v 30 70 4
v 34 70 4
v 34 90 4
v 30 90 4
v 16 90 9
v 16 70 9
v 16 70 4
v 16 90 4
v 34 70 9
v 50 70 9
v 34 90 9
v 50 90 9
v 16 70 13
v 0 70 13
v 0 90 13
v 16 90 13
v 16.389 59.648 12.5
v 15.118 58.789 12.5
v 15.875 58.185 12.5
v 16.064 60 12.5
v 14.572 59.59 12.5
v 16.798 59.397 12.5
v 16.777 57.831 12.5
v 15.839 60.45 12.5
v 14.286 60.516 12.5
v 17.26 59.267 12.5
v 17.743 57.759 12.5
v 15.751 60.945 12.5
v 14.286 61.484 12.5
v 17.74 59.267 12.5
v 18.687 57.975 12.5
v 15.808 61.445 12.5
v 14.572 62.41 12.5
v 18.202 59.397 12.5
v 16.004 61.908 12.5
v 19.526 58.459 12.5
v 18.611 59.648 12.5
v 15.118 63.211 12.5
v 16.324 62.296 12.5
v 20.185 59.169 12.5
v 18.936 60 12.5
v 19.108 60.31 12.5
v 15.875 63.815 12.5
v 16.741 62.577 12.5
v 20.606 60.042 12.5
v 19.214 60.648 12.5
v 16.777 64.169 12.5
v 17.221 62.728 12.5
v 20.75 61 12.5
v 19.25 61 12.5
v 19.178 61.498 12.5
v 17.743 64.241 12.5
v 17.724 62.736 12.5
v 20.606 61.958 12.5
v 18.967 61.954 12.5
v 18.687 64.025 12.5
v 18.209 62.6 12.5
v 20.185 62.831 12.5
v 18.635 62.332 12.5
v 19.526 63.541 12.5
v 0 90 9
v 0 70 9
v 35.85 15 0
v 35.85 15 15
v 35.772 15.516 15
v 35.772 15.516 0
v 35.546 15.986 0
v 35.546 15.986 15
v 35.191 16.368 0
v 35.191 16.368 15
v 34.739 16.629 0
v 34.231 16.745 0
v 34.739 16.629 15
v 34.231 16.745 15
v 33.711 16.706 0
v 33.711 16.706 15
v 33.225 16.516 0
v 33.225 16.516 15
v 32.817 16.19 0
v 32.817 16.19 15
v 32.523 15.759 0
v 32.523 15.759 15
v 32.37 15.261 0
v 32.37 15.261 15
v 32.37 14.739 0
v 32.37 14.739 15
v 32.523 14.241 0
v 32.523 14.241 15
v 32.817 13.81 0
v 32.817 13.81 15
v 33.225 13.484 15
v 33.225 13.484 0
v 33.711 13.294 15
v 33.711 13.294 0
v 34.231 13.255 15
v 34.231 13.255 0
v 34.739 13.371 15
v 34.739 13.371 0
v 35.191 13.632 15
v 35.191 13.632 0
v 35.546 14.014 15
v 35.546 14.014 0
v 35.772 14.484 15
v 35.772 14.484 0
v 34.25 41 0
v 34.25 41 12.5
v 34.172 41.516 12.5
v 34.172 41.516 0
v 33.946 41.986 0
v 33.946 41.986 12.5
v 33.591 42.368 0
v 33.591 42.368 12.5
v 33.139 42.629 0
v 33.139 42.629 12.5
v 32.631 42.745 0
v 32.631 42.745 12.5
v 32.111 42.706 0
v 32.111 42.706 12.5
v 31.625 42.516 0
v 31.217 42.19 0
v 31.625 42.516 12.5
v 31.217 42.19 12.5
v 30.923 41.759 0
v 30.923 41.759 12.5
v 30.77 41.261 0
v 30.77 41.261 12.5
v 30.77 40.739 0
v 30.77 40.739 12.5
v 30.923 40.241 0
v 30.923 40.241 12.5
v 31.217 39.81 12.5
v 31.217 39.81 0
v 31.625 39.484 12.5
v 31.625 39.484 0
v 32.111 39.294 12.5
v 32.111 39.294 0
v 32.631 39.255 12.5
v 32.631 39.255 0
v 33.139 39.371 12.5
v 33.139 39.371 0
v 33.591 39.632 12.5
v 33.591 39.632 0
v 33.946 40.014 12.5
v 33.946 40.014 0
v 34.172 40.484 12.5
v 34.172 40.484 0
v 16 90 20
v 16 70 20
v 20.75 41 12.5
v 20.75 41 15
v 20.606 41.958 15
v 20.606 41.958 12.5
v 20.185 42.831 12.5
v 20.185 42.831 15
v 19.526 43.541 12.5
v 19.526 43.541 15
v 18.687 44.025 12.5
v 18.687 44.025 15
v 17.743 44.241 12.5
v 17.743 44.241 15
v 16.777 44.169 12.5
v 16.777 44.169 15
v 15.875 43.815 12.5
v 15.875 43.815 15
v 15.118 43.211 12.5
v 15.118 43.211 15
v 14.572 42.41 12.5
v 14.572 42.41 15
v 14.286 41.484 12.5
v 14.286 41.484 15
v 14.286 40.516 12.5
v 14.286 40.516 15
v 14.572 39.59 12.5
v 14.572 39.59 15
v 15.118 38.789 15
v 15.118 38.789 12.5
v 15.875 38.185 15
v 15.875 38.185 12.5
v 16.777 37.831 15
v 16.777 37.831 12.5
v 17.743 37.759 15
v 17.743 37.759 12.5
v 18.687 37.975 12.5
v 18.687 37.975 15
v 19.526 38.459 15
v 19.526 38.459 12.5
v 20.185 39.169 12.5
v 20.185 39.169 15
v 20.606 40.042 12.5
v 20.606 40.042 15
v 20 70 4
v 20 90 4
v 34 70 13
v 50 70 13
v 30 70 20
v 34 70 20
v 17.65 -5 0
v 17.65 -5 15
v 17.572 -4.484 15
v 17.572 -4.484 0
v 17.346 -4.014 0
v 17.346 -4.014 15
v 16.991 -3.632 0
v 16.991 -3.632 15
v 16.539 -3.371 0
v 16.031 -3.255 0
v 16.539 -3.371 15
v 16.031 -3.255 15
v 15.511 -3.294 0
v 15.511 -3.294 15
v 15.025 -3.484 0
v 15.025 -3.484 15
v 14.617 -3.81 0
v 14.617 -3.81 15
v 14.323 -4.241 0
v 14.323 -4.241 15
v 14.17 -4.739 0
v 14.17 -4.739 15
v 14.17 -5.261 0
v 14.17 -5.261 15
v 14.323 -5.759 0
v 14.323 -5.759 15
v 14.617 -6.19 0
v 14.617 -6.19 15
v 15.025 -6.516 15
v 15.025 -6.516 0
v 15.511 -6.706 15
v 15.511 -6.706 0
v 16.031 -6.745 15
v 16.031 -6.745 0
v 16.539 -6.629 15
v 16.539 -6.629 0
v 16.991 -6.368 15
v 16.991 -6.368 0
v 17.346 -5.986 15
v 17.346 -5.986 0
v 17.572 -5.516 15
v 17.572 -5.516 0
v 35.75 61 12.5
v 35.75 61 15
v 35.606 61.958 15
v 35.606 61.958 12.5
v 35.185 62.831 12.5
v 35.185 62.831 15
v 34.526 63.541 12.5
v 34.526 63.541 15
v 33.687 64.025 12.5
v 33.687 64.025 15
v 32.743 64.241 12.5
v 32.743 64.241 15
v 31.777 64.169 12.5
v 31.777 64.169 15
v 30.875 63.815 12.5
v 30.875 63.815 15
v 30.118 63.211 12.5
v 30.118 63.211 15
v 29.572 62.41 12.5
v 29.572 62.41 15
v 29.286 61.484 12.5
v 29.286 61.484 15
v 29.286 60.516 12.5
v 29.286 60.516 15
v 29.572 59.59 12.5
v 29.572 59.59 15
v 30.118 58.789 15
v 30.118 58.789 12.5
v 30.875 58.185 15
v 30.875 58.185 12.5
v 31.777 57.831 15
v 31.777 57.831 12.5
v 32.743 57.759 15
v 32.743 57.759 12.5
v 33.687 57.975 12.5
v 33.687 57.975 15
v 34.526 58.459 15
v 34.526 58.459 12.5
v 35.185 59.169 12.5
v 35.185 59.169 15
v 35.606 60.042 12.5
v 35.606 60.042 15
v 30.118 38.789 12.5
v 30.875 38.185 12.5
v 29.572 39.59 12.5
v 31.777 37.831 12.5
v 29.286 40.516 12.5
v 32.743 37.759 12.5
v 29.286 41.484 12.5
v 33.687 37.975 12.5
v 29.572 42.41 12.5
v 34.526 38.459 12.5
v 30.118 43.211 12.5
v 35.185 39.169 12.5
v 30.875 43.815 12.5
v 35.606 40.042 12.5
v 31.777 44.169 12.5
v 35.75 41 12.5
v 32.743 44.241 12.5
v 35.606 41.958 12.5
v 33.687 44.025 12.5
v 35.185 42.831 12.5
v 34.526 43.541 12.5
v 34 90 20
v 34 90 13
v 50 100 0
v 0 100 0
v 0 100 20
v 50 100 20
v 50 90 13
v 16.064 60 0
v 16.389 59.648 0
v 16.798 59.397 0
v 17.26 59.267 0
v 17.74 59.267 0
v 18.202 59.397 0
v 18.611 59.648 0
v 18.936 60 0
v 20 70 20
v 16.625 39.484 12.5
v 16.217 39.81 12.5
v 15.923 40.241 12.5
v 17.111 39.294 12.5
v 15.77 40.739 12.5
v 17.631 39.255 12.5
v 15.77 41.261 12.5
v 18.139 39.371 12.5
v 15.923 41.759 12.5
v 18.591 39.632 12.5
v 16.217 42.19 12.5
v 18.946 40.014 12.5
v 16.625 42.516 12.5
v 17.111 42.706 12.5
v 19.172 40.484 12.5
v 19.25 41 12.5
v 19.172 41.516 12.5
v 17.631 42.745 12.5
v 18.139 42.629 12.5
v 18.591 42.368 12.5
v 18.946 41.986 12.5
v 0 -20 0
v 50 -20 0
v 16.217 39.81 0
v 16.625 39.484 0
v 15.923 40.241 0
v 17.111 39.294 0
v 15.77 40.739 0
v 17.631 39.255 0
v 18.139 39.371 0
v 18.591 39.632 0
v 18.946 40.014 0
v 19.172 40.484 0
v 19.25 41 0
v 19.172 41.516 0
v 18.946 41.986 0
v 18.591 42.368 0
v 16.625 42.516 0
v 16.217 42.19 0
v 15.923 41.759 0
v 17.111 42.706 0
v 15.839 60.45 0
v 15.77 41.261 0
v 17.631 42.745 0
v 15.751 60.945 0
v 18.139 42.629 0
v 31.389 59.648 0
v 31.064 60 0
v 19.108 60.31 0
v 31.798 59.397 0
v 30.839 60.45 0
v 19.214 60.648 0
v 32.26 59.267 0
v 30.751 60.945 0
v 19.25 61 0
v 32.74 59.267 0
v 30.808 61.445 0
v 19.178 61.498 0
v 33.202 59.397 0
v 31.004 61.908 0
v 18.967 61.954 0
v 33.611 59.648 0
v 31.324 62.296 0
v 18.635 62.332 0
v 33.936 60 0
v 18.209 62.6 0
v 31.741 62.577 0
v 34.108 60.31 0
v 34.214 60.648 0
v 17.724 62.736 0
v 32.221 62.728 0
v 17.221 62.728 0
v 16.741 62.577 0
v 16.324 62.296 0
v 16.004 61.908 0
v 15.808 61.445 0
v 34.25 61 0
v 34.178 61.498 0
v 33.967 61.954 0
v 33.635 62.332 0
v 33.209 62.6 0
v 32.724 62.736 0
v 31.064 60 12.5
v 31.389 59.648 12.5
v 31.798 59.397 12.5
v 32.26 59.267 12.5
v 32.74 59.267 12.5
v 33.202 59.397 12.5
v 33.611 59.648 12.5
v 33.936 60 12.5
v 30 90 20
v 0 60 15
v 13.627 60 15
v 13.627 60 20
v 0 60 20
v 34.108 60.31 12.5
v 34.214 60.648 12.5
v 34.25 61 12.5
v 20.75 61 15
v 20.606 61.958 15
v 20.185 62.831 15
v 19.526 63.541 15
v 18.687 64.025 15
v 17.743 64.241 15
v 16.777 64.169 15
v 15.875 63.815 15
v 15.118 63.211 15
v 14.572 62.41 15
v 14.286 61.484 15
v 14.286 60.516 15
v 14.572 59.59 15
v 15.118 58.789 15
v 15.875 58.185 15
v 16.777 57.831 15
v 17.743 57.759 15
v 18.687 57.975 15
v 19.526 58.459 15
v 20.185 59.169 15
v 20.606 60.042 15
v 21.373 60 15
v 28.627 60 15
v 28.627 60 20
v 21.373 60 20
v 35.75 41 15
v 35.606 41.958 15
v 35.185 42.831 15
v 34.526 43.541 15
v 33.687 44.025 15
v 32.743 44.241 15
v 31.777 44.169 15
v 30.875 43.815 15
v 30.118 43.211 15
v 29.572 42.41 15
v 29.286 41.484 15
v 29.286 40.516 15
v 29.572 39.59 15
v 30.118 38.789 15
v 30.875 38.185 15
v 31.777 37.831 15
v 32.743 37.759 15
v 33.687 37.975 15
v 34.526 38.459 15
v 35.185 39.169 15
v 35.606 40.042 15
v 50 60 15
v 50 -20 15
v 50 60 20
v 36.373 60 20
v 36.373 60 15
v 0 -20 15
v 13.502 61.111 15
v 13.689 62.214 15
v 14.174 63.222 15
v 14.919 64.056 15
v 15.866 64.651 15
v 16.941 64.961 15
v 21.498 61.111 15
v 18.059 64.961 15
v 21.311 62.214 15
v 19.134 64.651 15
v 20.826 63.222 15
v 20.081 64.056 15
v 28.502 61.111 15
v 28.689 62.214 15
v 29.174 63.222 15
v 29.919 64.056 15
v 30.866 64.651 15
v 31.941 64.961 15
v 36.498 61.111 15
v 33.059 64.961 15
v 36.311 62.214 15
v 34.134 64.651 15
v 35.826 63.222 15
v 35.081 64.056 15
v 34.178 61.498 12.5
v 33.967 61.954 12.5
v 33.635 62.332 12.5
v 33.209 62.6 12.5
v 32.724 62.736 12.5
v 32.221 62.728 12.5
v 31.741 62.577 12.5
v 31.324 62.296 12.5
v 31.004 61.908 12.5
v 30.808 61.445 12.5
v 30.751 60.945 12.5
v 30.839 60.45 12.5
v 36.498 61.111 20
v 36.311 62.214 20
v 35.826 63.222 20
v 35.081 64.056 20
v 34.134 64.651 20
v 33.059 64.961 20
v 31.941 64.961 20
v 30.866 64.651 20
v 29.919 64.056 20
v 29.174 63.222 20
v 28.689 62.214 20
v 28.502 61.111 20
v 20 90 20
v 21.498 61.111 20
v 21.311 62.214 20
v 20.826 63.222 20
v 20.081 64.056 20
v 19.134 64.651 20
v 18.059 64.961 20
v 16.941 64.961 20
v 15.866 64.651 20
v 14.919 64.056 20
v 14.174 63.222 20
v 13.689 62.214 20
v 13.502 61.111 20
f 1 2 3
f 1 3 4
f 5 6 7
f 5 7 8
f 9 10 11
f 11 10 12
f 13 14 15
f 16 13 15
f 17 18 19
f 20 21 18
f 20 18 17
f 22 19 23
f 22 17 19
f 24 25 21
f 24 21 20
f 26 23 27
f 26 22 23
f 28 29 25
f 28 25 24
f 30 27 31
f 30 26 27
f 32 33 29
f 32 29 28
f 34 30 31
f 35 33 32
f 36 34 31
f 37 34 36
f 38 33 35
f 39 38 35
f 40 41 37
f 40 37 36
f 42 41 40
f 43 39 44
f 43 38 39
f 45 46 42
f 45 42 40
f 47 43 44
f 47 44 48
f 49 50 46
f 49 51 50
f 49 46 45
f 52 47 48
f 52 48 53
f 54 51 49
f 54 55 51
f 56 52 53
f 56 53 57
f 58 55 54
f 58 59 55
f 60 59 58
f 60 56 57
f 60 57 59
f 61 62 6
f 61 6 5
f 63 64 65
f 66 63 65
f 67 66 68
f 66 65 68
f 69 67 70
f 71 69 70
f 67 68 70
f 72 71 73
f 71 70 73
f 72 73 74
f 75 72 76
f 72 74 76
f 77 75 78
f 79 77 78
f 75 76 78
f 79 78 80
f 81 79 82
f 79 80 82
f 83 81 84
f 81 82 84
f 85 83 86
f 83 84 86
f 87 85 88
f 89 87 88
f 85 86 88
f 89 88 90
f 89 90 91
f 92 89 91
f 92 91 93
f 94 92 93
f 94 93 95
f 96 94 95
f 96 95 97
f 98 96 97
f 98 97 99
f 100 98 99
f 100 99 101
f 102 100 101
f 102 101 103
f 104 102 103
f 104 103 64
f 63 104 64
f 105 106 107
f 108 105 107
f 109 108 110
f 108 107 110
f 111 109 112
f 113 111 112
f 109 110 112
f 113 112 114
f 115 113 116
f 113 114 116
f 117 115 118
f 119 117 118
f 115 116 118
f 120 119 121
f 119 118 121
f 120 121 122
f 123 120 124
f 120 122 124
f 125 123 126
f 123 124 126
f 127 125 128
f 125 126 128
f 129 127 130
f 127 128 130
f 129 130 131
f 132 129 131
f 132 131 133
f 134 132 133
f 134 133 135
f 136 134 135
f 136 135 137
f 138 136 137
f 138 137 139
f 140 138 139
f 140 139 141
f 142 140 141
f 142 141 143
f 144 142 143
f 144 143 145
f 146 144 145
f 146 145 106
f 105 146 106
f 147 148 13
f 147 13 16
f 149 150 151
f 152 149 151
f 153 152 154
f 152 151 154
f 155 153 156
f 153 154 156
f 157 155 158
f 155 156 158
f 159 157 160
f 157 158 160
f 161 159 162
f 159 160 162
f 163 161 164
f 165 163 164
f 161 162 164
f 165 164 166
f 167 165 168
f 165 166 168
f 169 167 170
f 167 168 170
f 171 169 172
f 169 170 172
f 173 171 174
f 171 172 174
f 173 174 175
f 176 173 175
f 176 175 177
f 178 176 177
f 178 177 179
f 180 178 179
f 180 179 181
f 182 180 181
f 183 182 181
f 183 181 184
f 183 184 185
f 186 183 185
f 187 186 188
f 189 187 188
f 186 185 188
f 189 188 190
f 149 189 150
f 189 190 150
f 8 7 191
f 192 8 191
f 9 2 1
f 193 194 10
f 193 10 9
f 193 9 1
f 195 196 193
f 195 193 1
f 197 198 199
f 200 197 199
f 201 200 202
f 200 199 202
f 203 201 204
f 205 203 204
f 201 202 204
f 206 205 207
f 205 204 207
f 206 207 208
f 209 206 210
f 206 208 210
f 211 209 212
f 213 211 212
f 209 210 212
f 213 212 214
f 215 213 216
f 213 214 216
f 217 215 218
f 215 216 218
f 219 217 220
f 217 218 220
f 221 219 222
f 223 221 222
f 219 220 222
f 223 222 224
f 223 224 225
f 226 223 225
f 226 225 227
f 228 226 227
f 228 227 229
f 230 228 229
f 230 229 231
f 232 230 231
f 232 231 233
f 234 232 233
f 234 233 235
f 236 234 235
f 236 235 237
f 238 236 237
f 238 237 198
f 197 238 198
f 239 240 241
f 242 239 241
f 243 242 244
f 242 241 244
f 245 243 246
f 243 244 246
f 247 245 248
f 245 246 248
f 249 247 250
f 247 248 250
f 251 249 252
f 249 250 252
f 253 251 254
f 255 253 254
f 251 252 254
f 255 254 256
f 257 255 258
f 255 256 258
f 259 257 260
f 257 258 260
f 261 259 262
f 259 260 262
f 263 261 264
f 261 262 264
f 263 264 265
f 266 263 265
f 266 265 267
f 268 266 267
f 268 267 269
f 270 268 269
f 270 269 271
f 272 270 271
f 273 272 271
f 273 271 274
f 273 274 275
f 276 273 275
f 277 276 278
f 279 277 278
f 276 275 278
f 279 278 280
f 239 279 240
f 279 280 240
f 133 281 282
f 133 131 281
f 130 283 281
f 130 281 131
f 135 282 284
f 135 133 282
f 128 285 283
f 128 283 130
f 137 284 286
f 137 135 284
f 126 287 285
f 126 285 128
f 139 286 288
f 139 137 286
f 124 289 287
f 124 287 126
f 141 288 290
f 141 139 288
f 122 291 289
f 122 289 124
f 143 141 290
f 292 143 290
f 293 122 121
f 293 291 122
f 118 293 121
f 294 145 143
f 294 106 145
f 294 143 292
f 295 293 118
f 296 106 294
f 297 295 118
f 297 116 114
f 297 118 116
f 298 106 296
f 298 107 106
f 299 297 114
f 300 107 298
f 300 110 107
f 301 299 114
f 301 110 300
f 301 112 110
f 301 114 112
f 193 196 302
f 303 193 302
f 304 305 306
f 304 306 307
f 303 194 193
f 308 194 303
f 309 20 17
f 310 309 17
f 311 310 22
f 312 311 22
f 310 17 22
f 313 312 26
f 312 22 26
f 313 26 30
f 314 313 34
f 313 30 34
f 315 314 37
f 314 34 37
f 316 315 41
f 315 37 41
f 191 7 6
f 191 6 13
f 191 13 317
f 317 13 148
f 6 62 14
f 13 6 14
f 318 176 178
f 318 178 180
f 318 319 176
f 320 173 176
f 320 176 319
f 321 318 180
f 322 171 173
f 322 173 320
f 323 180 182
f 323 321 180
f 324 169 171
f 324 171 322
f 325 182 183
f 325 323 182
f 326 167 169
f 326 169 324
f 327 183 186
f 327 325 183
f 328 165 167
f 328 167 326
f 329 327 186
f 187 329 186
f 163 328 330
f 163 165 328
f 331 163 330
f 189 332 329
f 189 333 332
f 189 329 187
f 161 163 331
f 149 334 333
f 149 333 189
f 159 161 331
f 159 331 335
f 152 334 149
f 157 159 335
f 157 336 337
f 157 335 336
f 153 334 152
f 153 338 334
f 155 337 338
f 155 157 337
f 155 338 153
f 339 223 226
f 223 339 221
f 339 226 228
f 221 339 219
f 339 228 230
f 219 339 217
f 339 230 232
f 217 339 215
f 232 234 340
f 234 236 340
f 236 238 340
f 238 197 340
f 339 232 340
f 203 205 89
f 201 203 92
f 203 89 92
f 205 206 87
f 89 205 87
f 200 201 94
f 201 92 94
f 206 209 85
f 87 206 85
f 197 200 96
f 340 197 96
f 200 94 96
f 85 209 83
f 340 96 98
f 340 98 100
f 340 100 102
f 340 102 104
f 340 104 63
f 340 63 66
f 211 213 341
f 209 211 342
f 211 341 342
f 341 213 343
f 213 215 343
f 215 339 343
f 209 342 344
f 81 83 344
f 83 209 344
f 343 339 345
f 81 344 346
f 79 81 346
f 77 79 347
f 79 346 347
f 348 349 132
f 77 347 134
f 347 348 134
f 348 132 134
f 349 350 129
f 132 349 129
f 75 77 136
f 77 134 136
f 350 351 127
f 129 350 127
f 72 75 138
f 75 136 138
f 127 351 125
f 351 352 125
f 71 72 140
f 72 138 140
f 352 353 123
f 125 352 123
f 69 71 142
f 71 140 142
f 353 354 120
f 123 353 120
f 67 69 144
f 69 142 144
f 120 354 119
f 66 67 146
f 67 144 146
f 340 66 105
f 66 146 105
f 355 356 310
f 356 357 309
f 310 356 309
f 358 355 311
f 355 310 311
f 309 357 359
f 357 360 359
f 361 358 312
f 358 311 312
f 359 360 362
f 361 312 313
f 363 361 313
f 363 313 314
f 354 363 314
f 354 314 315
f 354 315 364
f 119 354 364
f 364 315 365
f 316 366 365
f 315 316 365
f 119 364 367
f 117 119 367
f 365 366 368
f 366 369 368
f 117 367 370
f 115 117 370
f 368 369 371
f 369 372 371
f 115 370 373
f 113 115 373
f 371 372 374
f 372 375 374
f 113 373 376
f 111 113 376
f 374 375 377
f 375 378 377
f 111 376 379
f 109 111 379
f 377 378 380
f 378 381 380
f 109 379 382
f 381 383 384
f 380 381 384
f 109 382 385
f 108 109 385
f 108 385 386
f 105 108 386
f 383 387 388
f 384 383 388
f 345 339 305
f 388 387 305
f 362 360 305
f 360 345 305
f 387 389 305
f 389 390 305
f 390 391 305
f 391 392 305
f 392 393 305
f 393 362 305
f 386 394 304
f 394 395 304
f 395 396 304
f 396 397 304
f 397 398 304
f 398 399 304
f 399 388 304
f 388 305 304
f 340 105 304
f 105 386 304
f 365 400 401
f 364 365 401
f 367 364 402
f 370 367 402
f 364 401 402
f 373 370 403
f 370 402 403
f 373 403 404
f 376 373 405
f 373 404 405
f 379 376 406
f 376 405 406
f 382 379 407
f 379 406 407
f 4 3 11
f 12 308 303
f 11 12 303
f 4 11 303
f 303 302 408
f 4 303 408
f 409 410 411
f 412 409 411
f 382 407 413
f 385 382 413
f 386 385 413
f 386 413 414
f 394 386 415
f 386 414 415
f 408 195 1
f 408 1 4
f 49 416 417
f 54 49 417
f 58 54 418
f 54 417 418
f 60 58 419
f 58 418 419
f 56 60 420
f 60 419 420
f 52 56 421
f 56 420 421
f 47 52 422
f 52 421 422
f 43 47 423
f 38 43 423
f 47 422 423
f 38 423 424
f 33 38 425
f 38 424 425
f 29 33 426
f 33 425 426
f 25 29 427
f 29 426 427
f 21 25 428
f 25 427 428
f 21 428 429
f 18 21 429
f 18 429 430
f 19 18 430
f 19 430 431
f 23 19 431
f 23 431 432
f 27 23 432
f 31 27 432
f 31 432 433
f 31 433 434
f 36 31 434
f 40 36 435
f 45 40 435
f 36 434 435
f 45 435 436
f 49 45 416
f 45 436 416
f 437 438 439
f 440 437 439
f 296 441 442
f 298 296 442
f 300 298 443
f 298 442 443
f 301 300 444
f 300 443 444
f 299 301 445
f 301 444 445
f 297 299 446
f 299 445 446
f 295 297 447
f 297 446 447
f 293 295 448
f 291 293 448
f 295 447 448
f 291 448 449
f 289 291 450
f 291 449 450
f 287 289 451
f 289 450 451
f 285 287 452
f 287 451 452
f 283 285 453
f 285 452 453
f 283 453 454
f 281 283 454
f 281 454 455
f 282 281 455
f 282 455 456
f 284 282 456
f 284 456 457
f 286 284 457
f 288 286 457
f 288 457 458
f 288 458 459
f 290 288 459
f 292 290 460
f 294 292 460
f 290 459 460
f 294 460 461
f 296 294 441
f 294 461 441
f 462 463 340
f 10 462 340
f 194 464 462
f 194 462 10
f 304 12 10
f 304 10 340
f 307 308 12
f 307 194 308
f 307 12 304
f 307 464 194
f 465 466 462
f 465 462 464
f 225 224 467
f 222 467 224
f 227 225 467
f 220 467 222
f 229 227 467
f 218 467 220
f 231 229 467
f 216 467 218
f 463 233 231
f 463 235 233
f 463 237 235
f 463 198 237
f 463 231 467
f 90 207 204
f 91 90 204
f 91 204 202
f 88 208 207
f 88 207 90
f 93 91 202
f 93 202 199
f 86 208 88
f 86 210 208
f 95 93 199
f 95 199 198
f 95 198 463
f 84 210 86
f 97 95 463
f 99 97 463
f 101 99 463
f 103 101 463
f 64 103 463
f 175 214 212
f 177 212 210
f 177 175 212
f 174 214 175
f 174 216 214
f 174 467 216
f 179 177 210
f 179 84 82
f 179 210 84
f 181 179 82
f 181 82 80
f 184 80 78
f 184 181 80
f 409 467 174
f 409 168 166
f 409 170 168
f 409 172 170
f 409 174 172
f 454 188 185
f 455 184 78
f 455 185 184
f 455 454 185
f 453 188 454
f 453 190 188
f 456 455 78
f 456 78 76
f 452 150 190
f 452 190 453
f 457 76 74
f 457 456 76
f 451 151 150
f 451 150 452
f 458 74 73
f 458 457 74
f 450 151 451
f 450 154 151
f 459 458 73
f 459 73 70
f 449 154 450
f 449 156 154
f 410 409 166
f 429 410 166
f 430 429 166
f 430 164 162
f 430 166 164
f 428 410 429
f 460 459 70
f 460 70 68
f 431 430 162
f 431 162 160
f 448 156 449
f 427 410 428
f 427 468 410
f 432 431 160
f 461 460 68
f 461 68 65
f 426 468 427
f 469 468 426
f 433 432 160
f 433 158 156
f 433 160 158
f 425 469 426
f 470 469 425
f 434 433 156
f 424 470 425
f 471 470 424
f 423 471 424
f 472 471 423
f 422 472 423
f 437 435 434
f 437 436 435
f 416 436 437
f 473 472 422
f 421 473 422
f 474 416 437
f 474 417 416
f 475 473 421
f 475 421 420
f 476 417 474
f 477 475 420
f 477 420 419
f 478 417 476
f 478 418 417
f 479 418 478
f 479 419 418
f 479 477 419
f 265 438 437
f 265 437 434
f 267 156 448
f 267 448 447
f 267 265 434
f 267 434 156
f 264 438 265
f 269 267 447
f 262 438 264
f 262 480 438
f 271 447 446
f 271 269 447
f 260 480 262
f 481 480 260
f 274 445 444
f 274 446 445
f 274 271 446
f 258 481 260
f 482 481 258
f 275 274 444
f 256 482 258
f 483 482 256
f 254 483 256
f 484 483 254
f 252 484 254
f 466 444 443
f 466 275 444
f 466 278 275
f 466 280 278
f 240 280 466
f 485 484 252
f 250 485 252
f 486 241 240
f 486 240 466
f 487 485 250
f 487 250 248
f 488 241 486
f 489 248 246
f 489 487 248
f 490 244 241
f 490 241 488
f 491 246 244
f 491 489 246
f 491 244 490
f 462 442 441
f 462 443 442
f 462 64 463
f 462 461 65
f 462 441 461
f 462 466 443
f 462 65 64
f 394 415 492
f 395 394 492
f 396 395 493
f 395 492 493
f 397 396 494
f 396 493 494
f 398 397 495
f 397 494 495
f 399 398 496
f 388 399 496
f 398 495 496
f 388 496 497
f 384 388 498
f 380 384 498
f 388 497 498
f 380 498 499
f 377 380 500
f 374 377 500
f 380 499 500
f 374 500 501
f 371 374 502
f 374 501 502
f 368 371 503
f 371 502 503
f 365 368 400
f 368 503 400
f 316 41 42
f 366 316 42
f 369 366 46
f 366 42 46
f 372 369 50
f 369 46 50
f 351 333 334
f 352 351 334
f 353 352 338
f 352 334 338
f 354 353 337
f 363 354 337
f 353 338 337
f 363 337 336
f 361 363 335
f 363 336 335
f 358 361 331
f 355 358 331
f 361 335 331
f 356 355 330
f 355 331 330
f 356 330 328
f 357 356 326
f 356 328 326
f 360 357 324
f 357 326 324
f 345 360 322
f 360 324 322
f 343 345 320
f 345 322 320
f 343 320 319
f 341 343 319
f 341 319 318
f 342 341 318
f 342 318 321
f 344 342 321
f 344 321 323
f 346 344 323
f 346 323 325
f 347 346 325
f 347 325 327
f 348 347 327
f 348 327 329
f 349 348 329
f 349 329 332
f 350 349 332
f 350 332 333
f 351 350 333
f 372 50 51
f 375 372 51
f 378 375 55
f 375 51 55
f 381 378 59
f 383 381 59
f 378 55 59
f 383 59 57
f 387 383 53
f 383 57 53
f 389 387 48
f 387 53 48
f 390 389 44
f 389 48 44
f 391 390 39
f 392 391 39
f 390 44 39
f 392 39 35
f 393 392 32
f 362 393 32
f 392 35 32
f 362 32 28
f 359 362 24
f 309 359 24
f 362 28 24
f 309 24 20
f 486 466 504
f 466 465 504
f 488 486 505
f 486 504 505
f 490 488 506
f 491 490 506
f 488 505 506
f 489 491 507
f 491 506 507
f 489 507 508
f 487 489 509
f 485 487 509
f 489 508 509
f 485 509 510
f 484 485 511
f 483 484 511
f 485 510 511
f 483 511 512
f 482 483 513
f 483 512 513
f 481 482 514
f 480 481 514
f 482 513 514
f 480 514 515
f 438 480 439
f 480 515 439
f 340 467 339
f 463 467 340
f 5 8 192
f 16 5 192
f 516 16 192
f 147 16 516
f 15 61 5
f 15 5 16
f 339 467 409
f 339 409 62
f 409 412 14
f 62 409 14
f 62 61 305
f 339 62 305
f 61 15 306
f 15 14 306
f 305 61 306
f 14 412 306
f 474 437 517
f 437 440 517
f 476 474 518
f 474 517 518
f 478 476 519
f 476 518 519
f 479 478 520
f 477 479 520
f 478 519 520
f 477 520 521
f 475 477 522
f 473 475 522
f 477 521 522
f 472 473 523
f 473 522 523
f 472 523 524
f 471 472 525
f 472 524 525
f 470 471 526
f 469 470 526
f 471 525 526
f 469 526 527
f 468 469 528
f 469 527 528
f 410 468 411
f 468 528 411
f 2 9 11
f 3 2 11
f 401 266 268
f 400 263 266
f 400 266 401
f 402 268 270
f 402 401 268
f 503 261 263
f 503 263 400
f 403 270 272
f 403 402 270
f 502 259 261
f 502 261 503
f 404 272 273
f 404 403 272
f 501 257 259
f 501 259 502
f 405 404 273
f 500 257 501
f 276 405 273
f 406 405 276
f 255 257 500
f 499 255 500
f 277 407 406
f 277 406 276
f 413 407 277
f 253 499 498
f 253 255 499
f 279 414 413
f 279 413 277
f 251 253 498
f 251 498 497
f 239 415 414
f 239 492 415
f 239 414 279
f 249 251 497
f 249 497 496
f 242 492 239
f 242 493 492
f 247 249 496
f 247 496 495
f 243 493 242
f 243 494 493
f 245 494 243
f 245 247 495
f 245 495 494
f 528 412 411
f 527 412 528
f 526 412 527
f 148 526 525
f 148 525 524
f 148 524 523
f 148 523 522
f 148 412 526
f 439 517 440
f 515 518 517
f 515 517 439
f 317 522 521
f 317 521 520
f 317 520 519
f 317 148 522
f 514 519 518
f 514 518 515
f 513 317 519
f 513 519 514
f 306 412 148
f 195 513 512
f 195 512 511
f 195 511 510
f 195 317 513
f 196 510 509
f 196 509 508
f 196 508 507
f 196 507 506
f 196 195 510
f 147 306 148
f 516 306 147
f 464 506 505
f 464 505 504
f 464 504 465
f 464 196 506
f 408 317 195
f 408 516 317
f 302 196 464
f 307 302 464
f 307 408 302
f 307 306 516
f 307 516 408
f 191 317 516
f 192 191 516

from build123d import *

# Parameters (mm, degrees)
SKETCH1_W           = 50
SKETCH1_H           = 100
BOSS_EXTRUDE1_DEPTH = 20
SKETCH2_W           = 4
SKETCH2_H           = 20
CUT_EXTRUDE1_DEPTH  = 20
SKETCH3_W           = 4
SKETCH3_H           = 20
CUT_EXTRUDE2_DEPTH  = 16
SKETCH4_W           = 5
SKETCH4_H           = 60
CUT_EXTRUDE3_DEPTH  = 114.578166916
SKETCH6_R           = 1.75
CUT_EXTRUDE5_DEPTH  = 114.578166916
SKETCH7_R           = 4
CUT_EXTRUDE6_DEPTH  = 5
SKETCH8_R           = 3.25
CUT_EXTRUDE7_DEPTH  = 2.5
SKETCH9_W           = 50
SKETCH9_H           = 20
BOSS_EXTRUDE2_DEPTH = 15
SKETCH5_R           = 1.75
CUT_EXTRUDE4_DEPTH  = 113.805141727


with BuildPart() as part:
    # Sketch1 → Boss-Extrude1 (new body)
    with BuildSketch(Plane.XY):
        with Locations((25, 50)):
            Rectangle(SKETCH1_W, SKETCH1_H)
    extrude(amount=BOSS_EXTRUDE1_DEPTH)

    # Sketch2 → Cut-Extrude1 (cut)
    with BuildSketch(Plane.ZY):
        with Locations((11, 80)):
            Rectangle(SKETCH2_W, SKETCH2_H)
    cut_extrude1 = extrude(amount=-CUT_EXTRUDE1_DEPTH, mode=Mode.SUBTRACT)

    # Sketch3 → Cut-Extrude2 (cut)
    with BuildSketch(Plane.XY.offset(20)):
        with Locations((18, 80)):
            Rectangle(SKETCH3_W, SKETCH3_H)
    cut_extrude2 = extrude(amount=-CUT_EXTRUDE2_DEPTH, mode=Mode.SUBTRACT)

    # Mirror1: Cut-Extrude1, Cut-Extrude2 across plane
    add(cut_extrude1.mirror(Plane.ZY.offset(-25)), mode=Mode.SUBTRACT)
    add(cut_extrude2.mirror(Plane.ZY.offset(-25)), mode=Mode.SUBTRACT)

    # Sketch4 → Cut-Extrude3 (cut, through all)
    with BuildSketch(Plane.ZY):
        with Locations((17.5, 30)):
            Rectangle(SKETCH4_W, SKETCH4_H)
    extrude(amount=-CUT_EXTRUDE3_DEPTH, mode=Mode.SUBTRACT)

    # Sketch6 → Cut-Extrude5 (cut, through all)
    with BuildSketch(Plane.XY.offset(20)):
        with BuildLine():
            ThreePointArc((19.25, 61), (16.975951413, 62.66969251), (16.063859338, 60))
            Line((16.063859338, 60), (18.936140662, 60))
            ThreePointArc((18.936140662, 60), (19.16969251, 60.475951413), (19.25, 61))
        make_face()
        with BuildLine():
            Line((18.936140662, 60), (16.063859338, 60))
            ThreePointArc((16.063859338, 60), (17.5, 59.25), (18.936140662, 60))
        make_face()
        with BuildLine():
            ThreePointArc((34.25, 61), (31.975951413, 62.66969251), (31.063859338, 60))
            Line((31.063859338, 60), (33.936140662, 60))
            ThreePointArc((33.936140662, 60), (34.16969251, 60.475951413), (34.25, 61))
        make_face()
        with BuildLine():
            Line((33.936140662, 60), (31.063859338, 60))
            ThreePointArc((31.063859338, 60), (32.5, 59.25), (33.936140662, 60))
        make_face()
        with Locations((32.5, 41)):
            Circle(SKETCH6_R)
        with Locations((17.5, 41)):
            Circle(SKETCH6_R)
    extrude(amount=-CUT_EXTRUDE5_DEPTH, mode=Mode.SUBTRACT)

    # Sketch7 → Cut-Extrude6 (cut)
    with BuildSketch(Plane.XY.offset(20)):
        with Locations((32.5, 61)):
            Circle(SKETCH7_R)
        with Locations((17.5, 61)):
            Circle(SKETCH7_R)
    extrude(amount=-CUT_EXTRUDE6_DEPTH, mode=Mode.SUBTRACT)

    # Sketch8 → Cut-Extrude7 (cut)
    with BuildSketch(Plane.XY.offset(15)):
        with Locations((17.5, 61)):
            Circle(SKETCH8_R)
        with Locations((32.5, 61)):
            Circle(SKETCH8_R)
        with Locations((32.5, 41)):
            Circle(SKETCH8_R)
        with Locations((17.5, 41)):
            Circle(SKETCH8_R)
    extrude(amount=-CUT_EXTRUDE7_DEPTH, mode=Mode.SUBTRACT)

    # Sketch9 → Boss-Extrude2 (add)
    with BuildSketch(Plane.XY.offset(15)):
        with Locations((25, -10)):
            Rectangle(SKETCH9_W, SKETCH9_H)
    extrude(amount=-BOSS_EXTRUDE2_DEPTH)

    # Sketch5 → Cut-Extrude4 (cut, through all)
    with BuildSketch(Plane.XY.offset(15)):
        with Locations((34.1, 15)):
            Circle(SKETCH5_R)
        with Locations((15.9, -5)):
            Circle(SKETCH5_R)
    extrude(amount=-CUT_EXTRUDE4_DEPTH, mode=Mode.SUBTRACT)


solid = part.part
